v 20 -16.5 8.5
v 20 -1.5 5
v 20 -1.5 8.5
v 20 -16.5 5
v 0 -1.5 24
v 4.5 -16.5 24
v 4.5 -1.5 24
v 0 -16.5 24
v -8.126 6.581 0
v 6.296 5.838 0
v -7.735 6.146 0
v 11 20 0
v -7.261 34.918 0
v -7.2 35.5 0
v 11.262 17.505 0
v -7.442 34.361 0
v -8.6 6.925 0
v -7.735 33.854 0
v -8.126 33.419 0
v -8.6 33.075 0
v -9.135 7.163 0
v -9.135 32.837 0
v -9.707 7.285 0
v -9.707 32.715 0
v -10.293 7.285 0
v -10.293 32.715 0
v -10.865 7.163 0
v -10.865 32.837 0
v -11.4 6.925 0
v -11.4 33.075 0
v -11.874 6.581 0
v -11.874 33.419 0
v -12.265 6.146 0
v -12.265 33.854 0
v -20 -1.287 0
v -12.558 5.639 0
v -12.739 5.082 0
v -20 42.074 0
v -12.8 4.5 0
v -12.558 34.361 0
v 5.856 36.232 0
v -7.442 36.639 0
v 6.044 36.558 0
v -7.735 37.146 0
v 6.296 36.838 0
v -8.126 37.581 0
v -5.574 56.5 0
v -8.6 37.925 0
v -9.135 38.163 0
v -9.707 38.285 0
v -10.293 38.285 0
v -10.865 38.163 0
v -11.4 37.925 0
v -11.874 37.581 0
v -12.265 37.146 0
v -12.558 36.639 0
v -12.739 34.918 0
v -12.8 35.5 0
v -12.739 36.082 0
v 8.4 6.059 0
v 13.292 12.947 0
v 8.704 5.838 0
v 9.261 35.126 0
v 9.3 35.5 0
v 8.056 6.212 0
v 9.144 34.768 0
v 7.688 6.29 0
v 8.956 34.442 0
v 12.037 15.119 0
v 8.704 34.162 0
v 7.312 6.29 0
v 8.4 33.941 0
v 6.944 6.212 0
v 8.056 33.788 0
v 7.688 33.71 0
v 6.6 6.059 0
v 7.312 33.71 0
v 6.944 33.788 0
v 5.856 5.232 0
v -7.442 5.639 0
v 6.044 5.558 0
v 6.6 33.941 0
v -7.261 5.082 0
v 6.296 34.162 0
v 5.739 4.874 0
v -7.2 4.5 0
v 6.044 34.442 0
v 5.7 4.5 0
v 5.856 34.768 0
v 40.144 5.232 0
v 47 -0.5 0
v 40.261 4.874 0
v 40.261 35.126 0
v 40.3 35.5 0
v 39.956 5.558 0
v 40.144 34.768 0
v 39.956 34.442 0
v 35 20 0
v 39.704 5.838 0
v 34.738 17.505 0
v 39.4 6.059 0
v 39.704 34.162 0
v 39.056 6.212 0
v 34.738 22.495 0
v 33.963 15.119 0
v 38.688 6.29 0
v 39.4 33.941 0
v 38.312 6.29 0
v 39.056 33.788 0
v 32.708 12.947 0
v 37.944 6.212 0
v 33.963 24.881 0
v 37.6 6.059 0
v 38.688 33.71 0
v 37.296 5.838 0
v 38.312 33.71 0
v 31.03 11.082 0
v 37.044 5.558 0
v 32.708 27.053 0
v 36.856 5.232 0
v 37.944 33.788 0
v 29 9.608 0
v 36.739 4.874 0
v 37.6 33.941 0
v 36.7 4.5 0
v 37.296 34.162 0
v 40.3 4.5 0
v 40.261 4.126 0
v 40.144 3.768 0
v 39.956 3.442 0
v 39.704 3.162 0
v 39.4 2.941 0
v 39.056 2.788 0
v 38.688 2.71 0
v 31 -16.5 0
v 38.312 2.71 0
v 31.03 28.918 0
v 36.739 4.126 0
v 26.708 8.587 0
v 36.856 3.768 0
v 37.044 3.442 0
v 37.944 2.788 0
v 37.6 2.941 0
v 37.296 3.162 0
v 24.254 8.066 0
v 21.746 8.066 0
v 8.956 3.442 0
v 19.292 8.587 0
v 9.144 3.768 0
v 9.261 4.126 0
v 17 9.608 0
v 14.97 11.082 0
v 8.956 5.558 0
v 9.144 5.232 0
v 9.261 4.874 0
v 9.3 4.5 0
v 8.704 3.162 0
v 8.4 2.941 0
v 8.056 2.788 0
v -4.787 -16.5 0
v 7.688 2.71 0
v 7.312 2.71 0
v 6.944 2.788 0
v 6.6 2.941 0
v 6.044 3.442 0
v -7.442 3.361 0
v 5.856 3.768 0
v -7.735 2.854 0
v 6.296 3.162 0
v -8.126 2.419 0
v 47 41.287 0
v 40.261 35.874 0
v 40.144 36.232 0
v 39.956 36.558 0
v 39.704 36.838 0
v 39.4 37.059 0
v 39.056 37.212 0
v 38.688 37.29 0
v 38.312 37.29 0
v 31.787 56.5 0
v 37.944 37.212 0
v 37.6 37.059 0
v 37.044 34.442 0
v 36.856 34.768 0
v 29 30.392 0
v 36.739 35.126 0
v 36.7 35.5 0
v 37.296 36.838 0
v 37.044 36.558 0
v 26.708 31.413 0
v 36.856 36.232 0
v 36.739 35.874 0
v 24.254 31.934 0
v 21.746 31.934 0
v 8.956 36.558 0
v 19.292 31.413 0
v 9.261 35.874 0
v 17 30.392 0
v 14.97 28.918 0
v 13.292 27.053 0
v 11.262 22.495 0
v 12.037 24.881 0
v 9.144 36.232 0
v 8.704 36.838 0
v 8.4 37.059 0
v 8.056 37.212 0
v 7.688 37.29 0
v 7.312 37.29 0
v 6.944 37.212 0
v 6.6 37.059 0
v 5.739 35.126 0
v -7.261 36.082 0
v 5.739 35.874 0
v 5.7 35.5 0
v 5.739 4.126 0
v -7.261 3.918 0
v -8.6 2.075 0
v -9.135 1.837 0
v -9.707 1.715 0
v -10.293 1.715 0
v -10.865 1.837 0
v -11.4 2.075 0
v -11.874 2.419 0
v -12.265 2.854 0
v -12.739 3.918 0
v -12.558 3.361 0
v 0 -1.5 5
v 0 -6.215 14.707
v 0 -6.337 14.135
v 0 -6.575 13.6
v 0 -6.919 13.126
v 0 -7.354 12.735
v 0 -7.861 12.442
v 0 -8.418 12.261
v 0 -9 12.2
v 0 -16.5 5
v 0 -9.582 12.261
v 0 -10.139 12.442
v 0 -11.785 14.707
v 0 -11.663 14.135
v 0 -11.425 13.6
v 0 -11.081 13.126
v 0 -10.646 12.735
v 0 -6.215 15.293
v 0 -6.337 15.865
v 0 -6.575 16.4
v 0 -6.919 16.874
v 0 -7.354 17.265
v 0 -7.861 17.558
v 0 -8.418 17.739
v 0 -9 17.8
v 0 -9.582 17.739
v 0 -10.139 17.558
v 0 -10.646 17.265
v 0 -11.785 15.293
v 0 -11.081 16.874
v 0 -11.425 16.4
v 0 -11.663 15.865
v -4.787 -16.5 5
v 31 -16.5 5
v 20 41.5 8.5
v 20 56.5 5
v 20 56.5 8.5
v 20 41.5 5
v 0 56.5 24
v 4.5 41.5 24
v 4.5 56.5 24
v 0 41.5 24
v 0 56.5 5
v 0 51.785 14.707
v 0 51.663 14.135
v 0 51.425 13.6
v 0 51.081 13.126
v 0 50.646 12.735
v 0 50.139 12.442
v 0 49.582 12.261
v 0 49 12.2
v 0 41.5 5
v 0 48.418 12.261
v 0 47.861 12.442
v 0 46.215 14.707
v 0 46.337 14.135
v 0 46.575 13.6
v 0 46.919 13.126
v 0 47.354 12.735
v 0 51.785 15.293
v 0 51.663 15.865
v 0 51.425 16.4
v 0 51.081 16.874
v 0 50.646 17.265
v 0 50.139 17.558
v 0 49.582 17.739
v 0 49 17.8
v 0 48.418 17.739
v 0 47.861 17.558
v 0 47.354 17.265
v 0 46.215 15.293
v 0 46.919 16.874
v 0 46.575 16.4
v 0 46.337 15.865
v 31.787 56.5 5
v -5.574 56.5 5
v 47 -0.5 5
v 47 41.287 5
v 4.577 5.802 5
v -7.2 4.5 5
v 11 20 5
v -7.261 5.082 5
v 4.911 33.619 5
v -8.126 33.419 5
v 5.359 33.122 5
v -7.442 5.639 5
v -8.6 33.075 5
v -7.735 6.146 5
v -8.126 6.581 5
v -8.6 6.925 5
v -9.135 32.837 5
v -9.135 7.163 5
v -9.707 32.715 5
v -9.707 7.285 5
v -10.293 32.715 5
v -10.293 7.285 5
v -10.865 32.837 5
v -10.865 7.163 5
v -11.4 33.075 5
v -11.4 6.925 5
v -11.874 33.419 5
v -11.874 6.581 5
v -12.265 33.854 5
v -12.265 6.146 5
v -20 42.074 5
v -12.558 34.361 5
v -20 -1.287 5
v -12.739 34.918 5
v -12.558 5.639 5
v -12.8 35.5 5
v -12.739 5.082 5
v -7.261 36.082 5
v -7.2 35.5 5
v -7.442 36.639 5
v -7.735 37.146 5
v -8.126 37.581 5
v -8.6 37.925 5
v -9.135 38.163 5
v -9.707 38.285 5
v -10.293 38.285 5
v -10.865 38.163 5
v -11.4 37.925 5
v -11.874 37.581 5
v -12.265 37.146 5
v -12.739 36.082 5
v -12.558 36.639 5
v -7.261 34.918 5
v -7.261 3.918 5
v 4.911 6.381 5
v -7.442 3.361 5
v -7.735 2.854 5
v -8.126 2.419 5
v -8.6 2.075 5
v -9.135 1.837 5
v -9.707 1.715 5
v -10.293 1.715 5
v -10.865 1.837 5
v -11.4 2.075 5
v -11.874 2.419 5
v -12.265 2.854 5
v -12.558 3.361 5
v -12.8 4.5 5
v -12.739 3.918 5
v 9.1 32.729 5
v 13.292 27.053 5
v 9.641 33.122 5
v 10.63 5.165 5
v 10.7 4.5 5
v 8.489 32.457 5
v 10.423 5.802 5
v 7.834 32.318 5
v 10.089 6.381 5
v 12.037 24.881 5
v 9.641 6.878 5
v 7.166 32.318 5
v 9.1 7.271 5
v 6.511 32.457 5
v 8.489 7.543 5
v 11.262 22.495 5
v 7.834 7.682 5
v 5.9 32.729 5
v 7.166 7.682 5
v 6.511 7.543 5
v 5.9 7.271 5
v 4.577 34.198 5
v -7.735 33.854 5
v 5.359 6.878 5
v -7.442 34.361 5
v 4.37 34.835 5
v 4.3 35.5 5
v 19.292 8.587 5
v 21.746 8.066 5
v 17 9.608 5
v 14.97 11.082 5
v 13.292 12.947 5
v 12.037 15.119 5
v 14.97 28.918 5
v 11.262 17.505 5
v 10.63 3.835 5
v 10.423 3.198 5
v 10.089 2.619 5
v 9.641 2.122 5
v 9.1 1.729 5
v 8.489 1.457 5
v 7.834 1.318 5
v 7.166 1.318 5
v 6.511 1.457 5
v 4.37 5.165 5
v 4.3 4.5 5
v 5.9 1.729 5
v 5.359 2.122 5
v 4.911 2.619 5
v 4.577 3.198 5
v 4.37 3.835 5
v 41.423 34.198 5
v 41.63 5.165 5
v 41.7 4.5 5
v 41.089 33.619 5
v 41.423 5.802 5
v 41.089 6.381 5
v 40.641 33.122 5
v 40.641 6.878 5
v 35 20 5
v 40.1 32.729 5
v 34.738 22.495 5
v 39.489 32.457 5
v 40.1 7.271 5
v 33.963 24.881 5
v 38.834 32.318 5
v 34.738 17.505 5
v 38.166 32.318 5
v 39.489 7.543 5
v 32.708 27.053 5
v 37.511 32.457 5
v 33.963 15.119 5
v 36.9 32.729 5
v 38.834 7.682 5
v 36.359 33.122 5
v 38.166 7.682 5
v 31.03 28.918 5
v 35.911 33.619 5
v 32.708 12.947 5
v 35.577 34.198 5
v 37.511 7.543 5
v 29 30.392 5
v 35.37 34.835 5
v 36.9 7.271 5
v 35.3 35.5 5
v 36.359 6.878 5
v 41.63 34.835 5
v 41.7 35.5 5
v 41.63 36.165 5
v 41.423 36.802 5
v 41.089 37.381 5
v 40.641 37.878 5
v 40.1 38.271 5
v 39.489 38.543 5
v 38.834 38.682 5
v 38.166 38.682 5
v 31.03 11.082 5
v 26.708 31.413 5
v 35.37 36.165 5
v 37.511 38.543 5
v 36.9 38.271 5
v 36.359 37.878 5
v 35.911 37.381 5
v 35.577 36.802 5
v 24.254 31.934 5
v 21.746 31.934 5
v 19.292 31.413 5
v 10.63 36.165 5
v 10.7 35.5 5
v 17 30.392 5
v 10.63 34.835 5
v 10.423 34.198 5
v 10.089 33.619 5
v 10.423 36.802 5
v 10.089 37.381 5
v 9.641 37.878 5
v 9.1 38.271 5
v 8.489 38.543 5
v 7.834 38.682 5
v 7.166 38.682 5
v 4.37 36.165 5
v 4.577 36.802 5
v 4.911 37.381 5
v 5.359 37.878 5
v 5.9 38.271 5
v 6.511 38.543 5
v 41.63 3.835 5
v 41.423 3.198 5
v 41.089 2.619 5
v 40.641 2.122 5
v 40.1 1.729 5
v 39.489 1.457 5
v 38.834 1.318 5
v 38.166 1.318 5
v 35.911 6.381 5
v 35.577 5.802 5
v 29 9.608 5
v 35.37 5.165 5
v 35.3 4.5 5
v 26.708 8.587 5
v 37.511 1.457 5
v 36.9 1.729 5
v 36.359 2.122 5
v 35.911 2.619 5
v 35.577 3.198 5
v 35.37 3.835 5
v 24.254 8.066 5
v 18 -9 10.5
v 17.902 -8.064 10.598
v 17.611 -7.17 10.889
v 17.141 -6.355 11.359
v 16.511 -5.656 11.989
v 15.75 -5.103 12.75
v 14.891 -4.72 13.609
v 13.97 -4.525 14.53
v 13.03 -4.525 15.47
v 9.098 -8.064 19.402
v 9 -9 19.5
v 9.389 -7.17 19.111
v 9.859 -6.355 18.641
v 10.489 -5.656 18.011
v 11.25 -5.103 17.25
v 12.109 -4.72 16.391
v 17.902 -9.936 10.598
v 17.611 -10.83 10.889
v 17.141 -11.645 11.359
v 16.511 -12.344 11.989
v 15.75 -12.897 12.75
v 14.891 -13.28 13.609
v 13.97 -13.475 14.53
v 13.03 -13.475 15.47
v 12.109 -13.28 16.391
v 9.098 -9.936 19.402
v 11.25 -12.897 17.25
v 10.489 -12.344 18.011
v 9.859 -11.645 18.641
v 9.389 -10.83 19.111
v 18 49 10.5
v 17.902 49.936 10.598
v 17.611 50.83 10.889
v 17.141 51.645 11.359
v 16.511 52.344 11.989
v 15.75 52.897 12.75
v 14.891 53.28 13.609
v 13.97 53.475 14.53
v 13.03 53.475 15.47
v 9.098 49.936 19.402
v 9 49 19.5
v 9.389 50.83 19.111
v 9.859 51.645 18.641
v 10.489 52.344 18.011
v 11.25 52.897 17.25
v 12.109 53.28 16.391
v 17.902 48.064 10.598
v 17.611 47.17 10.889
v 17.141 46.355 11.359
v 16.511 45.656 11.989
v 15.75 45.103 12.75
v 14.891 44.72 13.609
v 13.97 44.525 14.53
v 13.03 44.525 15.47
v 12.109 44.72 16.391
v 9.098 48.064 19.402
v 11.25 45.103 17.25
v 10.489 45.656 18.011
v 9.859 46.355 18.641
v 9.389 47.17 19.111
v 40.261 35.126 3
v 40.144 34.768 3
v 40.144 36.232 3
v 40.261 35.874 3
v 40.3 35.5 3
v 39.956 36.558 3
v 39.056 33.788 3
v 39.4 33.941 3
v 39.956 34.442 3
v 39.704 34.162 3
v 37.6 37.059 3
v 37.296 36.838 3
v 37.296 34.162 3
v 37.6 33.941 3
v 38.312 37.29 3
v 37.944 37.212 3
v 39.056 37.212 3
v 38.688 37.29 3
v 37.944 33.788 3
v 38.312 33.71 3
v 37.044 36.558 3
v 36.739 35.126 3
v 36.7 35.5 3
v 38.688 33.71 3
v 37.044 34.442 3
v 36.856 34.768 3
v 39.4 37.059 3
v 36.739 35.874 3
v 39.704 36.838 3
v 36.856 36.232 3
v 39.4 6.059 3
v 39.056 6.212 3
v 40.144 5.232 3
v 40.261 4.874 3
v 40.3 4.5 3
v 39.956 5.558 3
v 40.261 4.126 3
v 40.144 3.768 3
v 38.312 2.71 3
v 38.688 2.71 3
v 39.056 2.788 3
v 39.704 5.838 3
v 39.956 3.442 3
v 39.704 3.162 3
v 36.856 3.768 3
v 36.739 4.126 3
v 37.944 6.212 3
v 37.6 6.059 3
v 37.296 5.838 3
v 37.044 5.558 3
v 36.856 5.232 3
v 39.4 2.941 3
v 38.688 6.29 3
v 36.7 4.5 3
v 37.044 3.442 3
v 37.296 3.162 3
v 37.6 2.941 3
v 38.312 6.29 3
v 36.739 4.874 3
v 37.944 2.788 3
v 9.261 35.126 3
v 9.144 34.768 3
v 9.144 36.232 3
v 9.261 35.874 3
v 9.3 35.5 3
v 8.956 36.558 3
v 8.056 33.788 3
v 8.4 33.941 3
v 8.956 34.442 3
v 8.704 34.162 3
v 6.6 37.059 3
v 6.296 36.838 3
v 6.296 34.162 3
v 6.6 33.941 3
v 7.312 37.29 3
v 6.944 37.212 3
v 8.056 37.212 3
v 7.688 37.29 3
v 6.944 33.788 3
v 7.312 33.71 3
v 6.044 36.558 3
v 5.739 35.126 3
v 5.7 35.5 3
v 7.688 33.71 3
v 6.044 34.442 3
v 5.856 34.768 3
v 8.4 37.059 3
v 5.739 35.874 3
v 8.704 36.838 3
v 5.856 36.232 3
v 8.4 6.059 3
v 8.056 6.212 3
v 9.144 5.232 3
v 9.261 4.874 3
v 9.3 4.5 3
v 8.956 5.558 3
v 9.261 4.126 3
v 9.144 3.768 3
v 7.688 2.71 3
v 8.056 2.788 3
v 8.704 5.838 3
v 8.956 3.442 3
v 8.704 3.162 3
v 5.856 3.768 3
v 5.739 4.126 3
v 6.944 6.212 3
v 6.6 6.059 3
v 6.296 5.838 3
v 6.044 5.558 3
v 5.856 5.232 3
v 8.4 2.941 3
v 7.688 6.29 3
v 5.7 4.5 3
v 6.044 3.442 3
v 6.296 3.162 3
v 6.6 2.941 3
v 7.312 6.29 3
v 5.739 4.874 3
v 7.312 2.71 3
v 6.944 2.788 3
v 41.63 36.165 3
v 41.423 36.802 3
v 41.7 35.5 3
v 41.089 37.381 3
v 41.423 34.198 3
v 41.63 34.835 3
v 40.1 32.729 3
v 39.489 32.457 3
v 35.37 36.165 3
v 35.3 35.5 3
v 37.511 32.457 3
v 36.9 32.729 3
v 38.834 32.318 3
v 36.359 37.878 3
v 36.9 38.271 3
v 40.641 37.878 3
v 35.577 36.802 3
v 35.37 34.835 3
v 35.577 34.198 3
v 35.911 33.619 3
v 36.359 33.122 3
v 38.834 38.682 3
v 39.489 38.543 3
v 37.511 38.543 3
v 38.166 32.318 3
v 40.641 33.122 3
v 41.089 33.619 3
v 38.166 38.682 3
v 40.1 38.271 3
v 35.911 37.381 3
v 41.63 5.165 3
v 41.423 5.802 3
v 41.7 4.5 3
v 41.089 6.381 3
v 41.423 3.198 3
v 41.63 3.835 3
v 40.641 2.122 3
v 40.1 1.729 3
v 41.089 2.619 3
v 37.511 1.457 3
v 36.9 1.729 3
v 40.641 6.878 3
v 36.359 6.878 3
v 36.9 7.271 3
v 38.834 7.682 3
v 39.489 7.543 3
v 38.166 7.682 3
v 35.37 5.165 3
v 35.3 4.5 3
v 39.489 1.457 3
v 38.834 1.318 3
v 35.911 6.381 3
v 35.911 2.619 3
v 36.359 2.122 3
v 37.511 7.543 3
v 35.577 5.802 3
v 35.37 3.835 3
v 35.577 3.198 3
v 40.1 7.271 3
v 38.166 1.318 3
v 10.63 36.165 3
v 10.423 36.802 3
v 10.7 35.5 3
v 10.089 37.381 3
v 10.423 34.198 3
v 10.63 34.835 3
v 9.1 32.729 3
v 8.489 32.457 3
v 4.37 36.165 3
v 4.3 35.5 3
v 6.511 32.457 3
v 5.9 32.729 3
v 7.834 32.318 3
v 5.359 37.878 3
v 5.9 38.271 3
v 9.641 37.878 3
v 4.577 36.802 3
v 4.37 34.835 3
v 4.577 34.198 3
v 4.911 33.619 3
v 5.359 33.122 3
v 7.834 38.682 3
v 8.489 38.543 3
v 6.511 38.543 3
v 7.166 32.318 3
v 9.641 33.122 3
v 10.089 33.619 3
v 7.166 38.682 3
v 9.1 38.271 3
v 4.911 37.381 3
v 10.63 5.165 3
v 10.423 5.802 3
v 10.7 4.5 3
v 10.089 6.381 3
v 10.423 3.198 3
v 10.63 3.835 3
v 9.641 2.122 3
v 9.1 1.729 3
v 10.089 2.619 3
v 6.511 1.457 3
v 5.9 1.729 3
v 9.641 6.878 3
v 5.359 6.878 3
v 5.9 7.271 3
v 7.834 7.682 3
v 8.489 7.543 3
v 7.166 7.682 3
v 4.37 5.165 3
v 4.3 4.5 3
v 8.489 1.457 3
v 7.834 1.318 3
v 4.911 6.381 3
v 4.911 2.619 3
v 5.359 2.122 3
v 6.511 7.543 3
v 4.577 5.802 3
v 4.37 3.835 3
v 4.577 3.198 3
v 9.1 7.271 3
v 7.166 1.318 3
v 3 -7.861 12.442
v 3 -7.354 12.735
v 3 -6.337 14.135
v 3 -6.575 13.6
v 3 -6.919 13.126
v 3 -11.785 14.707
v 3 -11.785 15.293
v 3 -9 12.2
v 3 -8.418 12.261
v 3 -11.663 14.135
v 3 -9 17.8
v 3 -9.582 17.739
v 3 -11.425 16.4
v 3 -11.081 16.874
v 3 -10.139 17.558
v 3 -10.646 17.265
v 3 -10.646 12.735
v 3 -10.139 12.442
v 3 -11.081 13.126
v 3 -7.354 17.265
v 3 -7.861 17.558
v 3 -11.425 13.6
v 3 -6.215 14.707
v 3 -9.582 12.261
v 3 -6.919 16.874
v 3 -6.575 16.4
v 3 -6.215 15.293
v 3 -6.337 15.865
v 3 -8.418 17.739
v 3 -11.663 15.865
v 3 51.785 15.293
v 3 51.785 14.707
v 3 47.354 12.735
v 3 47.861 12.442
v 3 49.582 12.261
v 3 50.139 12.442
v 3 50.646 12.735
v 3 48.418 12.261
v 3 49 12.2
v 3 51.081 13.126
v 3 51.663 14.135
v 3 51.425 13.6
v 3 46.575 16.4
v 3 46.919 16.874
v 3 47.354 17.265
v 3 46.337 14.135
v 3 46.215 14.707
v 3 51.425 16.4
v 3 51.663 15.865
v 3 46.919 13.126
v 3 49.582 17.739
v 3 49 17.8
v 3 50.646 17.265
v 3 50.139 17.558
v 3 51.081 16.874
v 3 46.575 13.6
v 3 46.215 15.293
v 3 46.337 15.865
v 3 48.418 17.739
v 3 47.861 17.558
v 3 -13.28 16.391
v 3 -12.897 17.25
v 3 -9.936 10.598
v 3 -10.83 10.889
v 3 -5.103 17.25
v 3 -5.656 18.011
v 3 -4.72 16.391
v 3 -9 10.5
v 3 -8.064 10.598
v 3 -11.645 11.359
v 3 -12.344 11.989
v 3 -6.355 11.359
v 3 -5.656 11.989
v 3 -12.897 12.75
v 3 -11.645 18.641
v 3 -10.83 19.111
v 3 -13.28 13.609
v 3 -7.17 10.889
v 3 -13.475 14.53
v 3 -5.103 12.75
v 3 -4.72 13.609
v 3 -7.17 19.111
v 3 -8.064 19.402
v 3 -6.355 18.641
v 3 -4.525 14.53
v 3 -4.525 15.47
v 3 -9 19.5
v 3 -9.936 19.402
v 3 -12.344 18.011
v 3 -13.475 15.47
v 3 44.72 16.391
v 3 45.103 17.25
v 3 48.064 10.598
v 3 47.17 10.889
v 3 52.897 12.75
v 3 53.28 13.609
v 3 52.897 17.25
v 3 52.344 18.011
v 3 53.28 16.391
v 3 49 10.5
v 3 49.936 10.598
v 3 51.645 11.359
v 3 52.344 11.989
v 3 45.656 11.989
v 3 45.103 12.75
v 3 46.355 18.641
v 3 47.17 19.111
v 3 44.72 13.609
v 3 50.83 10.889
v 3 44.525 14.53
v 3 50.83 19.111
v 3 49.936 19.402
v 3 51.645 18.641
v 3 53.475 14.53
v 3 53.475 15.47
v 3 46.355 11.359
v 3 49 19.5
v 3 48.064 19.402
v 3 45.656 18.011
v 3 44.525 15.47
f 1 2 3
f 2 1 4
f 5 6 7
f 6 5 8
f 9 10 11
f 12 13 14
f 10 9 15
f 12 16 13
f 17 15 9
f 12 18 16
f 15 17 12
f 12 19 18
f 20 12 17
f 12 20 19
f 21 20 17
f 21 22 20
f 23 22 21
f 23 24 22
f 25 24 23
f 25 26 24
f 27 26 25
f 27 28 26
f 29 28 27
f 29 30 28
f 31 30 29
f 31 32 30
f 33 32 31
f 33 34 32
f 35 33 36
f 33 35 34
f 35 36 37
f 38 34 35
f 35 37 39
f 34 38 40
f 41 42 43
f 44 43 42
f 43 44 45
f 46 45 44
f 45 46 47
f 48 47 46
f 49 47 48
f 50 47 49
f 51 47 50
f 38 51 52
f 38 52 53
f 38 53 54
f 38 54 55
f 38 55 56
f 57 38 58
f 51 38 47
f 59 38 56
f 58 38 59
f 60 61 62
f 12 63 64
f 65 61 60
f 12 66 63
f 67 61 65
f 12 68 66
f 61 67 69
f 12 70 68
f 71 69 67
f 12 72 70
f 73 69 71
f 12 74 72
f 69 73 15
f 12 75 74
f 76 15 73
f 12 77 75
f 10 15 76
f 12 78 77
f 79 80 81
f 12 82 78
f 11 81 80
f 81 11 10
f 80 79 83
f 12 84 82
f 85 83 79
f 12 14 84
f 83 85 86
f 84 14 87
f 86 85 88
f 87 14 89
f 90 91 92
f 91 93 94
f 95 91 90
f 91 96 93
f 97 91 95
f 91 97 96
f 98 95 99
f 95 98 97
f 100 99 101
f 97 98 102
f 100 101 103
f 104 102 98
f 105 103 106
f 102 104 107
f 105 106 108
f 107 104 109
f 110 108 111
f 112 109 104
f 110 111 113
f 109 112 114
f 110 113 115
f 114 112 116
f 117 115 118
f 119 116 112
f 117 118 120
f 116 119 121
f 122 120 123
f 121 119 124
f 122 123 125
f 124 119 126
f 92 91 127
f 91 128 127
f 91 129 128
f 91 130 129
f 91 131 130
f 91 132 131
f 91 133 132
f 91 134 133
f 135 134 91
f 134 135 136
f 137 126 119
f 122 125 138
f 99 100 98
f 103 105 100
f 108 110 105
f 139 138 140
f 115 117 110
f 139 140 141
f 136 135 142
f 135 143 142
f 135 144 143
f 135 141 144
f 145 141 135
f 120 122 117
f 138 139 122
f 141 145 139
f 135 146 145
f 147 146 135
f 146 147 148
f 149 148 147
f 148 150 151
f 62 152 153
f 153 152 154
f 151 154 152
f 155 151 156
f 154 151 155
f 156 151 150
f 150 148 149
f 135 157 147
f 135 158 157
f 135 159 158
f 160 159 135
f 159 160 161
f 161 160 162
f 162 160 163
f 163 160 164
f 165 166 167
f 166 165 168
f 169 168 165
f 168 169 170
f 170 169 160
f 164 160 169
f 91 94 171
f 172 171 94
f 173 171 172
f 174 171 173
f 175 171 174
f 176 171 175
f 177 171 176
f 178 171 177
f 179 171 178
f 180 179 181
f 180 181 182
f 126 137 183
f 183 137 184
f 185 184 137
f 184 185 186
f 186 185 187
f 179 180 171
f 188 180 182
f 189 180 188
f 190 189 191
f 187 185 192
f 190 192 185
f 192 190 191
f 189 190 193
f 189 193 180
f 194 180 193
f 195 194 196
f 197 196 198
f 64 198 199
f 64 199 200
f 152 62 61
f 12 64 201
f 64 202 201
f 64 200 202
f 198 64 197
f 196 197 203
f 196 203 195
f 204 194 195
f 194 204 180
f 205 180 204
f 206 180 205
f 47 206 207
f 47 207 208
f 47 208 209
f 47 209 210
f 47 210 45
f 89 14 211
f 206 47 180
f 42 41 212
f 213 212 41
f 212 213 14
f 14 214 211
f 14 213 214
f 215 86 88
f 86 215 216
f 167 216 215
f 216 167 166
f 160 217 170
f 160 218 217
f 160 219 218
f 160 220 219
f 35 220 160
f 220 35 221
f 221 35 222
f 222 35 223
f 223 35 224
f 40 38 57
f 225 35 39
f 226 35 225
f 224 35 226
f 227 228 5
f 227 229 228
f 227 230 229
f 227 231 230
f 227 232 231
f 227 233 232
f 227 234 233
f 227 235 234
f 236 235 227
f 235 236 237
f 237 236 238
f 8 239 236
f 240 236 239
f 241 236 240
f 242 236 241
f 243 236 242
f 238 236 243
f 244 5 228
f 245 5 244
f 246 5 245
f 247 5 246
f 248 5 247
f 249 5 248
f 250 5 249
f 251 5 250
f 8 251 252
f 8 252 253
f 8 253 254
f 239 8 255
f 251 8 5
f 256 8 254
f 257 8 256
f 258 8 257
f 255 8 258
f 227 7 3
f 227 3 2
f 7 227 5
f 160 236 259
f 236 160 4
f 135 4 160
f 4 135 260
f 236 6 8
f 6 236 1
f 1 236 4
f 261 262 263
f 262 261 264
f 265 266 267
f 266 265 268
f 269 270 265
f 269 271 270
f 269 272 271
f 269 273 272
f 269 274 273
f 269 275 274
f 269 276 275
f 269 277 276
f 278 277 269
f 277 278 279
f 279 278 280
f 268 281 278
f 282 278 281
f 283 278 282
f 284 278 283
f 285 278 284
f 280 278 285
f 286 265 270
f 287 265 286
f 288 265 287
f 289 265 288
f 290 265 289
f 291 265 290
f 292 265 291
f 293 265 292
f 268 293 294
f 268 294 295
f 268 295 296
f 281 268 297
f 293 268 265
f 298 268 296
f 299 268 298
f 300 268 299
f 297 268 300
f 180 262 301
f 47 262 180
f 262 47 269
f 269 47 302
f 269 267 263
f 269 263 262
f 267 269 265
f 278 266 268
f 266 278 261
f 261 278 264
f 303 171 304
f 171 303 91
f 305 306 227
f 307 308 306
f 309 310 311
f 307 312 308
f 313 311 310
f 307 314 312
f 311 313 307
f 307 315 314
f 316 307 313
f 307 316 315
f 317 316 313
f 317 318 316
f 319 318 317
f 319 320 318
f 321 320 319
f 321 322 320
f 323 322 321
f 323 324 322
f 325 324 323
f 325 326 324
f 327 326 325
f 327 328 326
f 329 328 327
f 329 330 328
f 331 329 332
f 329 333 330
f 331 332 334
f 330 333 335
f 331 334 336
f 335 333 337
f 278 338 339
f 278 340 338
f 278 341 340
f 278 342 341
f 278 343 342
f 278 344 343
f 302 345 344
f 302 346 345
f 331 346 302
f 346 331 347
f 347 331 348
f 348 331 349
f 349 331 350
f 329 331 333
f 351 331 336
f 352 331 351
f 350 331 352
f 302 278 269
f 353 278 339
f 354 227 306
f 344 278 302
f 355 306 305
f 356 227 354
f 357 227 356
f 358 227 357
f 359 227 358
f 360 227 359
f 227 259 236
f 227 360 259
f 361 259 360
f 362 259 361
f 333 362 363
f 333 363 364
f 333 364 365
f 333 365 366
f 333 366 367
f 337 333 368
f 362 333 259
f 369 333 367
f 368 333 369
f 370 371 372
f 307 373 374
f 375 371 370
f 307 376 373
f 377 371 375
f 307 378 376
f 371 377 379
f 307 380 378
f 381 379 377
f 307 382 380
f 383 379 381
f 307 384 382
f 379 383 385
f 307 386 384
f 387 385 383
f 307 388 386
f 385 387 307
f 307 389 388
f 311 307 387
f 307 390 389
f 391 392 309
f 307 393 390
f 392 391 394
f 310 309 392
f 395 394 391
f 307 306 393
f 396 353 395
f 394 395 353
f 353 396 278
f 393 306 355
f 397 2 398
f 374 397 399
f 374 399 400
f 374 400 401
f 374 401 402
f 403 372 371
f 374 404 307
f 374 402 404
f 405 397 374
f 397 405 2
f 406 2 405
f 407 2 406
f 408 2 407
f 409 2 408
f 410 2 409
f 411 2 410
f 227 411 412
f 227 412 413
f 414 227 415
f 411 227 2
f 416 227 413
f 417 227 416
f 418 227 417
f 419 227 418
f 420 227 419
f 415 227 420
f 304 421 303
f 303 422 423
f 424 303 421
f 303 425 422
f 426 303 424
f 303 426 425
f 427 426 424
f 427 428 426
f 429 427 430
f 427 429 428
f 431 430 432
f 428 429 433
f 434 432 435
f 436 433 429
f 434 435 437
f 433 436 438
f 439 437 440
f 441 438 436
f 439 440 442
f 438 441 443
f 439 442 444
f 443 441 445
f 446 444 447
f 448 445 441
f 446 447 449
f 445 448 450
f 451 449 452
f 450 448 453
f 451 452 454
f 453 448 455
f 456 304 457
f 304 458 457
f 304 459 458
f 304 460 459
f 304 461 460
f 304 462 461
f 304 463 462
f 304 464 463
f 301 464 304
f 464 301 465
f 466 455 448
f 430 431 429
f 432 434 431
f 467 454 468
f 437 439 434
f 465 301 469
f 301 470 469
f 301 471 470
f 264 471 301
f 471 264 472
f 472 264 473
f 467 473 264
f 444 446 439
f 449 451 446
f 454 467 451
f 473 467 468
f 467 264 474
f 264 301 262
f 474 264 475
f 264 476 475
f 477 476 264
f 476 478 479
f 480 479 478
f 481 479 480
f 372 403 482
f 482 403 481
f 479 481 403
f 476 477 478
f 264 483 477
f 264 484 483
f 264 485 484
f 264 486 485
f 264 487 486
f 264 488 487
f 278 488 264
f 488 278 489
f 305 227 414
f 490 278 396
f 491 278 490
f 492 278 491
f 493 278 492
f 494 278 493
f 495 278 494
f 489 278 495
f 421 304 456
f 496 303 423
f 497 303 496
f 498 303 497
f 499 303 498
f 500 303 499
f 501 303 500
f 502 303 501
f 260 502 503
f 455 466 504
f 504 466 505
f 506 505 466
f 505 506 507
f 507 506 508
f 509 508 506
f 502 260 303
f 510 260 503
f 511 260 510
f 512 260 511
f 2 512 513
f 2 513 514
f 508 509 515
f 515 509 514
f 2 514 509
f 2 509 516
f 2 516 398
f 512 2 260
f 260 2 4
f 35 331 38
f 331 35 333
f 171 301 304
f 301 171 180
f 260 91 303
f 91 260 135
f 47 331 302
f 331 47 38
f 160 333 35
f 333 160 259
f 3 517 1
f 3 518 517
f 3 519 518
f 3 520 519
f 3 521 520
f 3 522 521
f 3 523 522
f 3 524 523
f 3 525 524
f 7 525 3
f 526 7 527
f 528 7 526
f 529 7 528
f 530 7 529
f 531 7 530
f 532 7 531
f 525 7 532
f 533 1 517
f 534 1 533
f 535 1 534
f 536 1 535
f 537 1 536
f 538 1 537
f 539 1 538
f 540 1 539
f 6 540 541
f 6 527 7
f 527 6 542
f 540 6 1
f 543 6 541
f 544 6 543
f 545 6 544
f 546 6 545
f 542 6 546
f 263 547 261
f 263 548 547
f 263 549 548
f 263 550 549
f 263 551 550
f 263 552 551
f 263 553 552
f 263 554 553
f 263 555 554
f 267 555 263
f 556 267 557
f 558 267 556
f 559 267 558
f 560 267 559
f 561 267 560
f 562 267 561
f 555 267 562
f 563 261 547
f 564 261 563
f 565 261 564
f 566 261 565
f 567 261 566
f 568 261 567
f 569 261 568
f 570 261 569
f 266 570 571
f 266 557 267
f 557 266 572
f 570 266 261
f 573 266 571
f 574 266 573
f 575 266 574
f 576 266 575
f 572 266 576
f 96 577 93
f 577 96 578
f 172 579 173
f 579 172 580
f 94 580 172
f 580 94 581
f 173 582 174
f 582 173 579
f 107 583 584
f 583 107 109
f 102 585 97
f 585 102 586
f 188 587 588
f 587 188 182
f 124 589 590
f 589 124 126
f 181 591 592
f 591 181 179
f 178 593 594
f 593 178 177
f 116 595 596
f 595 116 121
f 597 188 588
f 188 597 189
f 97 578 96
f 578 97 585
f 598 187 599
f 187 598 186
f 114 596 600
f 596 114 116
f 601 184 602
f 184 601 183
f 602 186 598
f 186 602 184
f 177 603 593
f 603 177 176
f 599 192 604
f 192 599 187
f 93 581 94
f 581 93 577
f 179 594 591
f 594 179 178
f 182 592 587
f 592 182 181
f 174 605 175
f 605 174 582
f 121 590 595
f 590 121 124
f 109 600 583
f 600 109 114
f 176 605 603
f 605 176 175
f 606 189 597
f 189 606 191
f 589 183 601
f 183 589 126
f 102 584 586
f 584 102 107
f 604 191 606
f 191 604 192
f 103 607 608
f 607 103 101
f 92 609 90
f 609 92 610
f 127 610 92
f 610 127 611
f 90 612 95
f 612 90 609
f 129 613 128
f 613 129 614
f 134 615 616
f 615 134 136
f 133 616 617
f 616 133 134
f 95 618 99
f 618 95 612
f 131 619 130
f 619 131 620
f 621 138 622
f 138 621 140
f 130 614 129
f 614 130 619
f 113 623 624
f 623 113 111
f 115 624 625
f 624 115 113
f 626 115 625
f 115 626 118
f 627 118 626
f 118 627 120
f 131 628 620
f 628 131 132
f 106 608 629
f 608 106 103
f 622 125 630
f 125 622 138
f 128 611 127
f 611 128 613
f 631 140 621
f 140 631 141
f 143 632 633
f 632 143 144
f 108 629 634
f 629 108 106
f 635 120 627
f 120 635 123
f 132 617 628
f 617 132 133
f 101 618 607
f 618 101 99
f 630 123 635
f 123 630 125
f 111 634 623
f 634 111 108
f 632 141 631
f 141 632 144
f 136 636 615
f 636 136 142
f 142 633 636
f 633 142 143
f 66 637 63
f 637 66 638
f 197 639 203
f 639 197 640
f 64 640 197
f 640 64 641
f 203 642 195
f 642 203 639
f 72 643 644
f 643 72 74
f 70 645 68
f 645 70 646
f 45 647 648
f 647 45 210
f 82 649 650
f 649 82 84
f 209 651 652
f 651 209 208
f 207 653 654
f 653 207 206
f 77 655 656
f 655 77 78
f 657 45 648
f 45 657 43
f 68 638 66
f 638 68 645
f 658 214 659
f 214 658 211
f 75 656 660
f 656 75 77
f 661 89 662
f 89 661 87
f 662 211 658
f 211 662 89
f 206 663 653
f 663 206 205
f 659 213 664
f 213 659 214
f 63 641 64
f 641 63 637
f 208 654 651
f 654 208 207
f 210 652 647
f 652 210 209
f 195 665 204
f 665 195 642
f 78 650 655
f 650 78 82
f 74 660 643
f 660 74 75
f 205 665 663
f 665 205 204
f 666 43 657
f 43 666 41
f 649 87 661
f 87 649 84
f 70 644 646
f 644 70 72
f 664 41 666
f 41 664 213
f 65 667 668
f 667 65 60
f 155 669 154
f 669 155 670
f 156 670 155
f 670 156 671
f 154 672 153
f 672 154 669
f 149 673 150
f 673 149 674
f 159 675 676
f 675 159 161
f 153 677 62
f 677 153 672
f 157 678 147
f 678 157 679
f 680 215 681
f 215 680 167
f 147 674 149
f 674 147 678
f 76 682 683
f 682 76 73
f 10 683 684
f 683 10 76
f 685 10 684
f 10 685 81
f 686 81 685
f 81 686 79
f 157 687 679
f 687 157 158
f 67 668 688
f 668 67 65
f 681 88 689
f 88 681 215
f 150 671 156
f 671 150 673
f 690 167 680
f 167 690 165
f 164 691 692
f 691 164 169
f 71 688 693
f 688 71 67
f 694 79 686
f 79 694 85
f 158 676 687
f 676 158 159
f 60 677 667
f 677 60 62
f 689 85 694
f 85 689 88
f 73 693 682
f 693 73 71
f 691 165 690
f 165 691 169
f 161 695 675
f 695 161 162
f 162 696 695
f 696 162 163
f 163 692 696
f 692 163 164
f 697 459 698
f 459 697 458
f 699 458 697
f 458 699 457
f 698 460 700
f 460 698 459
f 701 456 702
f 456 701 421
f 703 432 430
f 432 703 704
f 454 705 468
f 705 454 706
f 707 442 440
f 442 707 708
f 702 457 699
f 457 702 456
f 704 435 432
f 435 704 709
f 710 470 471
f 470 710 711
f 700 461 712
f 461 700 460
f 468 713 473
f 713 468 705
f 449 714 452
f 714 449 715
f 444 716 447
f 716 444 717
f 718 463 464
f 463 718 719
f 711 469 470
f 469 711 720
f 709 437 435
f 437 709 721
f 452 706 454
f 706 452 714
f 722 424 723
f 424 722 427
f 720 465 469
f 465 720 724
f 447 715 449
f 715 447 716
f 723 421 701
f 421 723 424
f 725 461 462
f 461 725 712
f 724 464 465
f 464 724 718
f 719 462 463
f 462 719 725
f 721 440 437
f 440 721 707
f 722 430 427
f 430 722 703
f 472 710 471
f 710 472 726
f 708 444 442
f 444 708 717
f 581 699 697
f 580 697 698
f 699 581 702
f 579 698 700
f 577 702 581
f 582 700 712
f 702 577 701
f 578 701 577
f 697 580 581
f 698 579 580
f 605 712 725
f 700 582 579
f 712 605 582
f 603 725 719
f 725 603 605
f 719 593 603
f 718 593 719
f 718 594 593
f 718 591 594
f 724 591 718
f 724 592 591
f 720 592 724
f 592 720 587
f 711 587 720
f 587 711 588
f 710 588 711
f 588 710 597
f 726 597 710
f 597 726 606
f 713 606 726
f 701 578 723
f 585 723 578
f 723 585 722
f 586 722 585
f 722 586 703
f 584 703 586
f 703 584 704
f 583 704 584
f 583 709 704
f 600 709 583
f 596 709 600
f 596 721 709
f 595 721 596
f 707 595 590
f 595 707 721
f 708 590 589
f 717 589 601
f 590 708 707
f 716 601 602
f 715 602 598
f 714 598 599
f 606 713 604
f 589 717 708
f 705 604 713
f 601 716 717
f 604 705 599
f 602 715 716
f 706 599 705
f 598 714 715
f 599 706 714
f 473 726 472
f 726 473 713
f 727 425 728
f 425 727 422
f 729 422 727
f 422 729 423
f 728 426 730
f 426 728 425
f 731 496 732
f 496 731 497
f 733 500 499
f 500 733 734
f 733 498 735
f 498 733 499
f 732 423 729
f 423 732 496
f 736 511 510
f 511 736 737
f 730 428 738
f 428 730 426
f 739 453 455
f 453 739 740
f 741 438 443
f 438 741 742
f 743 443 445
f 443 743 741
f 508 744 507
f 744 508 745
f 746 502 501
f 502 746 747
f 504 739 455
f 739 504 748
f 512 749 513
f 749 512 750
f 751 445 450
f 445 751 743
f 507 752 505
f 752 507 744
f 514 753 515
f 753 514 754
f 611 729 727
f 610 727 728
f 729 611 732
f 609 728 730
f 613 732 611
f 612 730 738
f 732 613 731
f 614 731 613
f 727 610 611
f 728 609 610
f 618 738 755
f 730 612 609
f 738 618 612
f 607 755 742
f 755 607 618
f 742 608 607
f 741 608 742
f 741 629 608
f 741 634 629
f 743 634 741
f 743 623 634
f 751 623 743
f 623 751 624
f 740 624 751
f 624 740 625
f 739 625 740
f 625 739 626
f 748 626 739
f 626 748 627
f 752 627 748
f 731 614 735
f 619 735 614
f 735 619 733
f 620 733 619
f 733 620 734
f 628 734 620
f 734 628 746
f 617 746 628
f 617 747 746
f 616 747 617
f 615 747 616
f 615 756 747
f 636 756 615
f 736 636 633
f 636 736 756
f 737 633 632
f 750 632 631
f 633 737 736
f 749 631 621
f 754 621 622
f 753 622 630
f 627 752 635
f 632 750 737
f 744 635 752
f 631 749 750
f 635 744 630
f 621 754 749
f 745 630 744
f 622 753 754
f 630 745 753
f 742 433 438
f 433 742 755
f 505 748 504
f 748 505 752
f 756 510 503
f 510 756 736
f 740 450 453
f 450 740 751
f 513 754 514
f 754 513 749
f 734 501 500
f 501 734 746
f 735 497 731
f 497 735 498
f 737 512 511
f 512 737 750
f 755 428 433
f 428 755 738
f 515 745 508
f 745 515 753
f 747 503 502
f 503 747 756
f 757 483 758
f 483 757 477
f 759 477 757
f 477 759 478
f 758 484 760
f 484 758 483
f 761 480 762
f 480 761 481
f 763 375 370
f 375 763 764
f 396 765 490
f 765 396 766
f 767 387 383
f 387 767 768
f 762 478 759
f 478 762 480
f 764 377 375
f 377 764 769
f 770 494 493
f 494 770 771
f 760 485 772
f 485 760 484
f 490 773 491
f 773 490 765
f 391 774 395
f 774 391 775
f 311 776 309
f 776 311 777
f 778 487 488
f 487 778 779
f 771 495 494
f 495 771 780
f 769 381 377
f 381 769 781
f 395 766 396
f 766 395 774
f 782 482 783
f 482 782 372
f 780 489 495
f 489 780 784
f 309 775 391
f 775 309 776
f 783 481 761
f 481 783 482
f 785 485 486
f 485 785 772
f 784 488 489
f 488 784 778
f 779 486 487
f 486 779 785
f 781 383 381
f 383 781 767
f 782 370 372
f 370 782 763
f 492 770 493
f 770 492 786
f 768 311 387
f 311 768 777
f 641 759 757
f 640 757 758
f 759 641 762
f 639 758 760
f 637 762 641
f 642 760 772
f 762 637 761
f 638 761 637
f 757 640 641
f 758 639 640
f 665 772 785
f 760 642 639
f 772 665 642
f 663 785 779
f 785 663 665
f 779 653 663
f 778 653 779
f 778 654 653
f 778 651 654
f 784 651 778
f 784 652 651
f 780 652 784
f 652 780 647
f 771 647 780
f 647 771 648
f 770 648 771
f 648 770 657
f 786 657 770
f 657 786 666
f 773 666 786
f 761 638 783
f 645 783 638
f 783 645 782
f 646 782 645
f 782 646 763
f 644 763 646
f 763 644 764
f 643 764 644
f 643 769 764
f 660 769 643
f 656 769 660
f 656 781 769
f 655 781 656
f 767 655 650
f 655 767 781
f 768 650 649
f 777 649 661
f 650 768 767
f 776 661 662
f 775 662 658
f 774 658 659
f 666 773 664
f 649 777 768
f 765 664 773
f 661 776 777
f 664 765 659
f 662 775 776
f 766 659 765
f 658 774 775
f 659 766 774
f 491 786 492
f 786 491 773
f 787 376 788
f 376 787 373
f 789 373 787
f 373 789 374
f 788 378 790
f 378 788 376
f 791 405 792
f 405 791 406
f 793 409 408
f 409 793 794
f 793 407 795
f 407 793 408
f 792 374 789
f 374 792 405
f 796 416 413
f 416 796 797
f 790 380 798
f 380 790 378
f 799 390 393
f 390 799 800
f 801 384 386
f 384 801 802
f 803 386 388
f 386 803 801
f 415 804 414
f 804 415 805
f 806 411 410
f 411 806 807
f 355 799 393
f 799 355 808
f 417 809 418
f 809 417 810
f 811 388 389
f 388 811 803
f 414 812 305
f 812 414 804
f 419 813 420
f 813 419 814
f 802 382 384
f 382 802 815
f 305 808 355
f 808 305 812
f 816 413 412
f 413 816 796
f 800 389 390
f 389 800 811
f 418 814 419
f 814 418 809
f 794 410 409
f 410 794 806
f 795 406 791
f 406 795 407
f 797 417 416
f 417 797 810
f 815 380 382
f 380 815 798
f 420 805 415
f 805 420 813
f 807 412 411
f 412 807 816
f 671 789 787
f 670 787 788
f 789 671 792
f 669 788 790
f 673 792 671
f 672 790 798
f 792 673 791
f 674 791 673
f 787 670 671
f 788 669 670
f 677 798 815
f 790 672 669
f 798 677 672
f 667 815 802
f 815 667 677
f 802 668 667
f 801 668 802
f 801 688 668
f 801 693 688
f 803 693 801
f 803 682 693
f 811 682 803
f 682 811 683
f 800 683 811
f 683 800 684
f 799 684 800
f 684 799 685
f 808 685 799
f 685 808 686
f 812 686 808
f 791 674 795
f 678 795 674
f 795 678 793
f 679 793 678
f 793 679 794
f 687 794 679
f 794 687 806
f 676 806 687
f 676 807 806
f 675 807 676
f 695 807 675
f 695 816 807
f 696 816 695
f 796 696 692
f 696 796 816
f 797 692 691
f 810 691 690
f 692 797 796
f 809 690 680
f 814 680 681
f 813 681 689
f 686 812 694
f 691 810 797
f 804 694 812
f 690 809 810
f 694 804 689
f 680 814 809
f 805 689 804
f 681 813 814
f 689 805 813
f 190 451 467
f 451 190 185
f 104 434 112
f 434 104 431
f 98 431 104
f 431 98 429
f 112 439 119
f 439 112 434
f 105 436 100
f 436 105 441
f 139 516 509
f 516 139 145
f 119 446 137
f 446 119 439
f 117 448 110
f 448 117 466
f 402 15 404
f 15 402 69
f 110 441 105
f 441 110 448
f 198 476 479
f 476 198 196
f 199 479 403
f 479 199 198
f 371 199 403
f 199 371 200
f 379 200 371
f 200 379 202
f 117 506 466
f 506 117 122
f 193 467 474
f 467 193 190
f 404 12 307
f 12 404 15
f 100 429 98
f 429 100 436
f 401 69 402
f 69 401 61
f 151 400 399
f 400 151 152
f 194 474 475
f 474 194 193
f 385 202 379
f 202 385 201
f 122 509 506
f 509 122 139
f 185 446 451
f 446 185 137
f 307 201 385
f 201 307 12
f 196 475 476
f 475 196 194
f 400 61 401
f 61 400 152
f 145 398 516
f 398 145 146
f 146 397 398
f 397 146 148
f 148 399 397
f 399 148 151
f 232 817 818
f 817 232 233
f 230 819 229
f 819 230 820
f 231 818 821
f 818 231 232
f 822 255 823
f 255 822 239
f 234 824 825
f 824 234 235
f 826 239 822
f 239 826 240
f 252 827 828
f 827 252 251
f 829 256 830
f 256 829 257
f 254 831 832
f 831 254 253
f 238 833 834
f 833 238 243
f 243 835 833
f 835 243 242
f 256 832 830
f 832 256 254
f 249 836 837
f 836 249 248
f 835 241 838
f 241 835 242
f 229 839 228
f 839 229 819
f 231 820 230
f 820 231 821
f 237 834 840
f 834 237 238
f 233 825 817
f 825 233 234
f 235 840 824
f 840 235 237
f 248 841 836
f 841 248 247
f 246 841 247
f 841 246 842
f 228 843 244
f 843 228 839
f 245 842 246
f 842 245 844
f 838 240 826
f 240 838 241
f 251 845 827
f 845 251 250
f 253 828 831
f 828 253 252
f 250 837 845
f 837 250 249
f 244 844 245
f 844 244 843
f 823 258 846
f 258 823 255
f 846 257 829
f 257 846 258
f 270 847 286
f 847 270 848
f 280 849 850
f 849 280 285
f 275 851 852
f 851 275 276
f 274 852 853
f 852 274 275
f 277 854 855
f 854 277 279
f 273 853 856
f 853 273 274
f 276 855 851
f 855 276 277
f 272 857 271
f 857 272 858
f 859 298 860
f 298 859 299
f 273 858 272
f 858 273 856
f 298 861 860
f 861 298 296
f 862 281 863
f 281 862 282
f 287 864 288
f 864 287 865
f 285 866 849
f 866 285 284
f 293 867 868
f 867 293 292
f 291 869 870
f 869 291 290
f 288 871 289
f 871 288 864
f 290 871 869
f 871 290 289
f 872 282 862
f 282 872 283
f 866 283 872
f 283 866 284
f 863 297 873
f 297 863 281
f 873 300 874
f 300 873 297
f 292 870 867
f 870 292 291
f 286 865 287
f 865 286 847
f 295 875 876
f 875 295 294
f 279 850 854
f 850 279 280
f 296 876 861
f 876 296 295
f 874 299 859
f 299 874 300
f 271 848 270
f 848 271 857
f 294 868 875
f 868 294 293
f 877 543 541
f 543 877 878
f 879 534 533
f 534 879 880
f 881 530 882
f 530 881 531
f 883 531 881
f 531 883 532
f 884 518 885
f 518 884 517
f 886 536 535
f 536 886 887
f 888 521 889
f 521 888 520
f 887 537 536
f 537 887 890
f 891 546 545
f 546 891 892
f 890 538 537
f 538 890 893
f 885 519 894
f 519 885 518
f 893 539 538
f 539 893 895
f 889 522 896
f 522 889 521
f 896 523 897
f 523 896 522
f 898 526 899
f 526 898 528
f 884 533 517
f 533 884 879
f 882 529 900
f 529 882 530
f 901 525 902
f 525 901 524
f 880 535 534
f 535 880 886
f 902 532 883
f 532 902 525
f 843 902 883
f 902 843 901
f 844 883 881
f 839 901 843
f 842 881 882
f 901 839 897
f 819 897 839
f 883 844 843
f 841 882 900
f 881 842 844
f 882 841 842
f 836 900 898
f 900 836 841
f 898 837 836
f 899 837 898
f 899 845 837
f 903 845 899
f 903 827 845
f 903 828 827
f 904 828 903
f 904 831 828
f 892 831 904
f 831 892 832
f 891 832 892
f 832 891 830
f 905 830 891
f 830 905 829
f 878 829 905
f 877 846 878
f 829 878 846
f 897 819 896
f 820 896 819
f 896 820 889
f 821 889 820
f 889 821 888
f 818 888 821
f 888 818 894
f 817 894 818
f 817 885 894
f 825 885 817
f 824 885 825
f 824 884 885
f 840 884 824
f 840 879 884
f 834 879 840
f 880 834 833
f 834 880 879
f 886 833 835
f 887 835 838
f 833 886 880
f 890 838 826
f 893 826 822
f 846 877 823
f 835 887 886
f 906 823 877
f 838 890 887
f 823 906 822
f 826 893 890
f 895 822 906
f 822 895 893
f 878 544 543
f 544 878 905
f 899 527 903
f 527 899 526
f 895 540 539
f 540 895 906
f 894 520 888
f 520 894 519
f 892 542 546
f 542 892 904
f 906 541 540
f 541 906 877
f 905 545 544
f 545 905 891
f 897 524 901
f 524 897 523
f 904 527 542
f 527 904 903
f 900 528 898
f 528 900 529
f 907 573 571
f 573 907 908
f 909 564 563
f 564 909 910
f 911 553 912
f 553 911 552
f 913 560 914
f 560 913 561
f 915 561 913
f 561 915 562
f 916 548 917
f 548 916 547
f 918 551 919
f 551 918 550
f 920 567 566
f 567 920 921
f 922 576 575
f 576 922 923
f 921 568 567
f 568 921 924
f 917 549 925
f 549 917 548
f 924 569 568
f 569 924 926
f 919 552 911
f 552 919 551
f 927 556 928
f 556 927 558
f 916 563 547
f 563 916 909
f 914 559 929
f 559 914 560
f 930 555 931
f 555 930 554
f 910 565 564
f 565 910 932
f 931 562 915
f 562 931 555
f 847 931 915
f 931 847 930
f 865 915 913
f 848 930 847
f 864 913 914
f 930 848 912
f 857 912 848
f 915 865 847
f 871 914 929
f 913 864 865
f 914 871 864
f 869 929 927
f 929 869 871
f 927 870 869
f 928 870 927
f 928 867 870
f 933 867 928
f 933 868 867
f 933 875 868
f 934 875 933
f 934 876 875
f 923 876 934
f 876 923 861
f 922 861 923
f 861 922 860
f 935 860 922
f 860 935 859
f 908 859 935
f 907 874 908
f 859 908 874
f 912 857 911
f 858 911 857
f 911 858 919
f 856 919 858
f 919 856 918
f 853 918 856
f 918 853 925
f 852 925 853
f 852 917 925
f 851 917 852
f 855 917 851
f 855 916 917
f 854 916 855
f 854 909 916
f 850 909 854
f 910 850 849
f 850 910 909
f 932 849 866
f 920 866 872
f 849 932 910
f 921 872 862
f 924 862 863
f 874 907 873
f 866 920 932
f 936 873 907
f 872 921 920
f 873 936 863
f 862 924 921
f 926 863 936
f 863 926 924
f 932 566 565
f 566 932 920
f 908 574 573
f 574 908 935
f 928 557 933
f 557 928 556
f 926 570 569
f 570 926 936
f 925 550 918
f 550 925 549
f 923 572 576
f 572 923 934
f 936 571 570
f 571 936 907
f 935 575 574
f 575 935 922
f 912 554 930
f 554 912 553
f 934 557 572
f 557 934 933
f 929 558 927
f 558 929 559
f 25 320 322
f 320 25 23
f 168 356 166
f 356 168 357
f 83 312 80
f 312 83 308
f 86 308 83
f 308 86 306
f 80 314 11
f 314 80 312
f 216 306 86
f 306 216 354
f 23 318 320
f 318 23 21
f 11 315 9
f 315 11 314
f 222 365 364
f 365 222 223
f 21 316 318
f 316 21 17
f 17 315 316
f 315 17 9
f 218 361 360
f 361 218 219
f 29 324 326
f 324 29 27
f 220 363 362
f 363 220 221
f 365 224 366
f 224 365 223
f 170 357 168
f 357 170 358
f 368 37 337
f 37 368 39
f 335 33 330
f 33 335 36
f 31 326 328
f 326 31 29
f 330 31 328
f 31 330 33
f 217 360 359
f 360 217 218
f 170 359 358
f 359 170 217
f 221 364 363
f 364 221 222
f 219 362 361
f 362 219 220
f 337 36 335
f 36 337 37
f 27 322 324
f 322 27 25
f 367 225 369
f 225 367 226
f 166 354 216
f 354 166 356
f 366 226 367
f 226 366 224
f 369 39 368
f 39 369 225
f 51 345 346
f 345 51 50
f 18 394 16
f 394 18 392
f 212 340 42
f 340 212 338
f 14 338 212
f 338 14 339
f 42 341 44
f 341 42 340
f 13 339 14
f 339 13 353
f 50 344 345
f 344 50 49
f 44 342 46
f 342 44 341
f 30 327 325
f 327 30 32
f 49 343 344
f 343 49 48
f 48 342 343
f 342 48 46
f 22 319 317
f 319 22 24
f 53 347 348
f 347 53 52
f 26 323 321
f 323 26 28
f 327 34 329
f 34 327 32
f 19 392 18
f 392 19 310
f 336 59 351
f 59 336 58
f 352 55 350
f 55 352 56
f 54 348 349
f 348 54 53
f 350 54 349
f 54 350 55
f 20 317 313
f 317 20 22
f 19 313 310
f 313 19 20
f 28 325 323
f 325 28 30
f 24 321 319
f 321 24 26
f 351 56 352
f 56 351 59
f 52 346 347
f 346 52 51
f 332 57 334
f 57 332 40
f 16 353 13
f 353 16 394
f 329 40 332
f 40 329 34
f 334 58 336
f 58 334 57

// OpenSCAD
// PRUSA iteration3
// Z axis bottom holder
// GNU GPL v3
// Josef Průša <iam@josefprusa.cz> and contributors
// http://www.reprap.org/wiki/Prusa_Mendel
// http://prusamendel.org

module z_bottom_base(){
 translate([0,-16.5,0]) cube([20,15,24]); // plate touching the base
 translate([0,41.5,0]) cube([20,15,24]); // plate touching the base
 translate([-20,-16.5,0]) cube([67,73,5]); // plate touching the base
}

module z_bottom_fancy(){
    translate([47-6,-1+2.5+67,0]) rotate([0,0,-45-90]) translate([-15,0,-1]) cube([30,30,51]);
    translate([47-6,-9+2.5,0]) rotate([0,0,-45-90]) translate([-15,0,-1]) cube([30,30,51]);
 
    translate([-36,-1+2.5+67,0]) rotate([0,0,-45-90]) translate([-15,0,-1]) cube([30,30,51]);
    translate([-36,-9+2.5,0]) rotate([0,0,-45-90]) translate([-15,0,-1]) cube([30,30,51]);
 
    // Stiffner cut out
    translate([23,0,5.5]) rotate([0,-45,0]) translate([0,-17.1,0]) cube([30,80,30]);
}

module z_bottom_holes(){
    // Frame mounting screw holes
    translate([-1,-9,15]) rotate([0,90,0]) cylinder(h = 50, r=2.8, $fn=30);
    translate([-1,49,15]) rotate([0,90,0]) cylinder(h = 50, r=2.8, $fn=30);

    // Frame mounting screw head holes
    translate([3,-9,15]) rotate([0,90,0]) cylinder(h = 20, r=4.5, $fn=30);
    translate([3,49,15]) rotate([0,90,0]) cylinder(h = 20, r=4.5, $fn=30);

    // Frame mounting screw holes
    translate([-10,4.5,-1]) cylinder(h = 50, r=2.8, $fn=30);
    translate([-10,35.5,-1]) cylinder(h = 50, r=2.8, $fn=30);

    // motor mounting
    translate([23,20,-1]){

    translate([15.5,15.5,-1]) cylinder(h = 30, r=1.8, $fn=30);
    translate([15.5,-15.5,-1]) cylinder(h = 30, r=1.8, $fn=30);
    translate([-15.5,15.5,-1]) cylinder(h = 30, r=1.8, $fn=30);
    translate([-15.5,-15.5,-1]) cylinder(h = 30, r=1.8, $fn=30);

    translate([15.5,15.5,4]) cylinder(h = 30, r=3.2, $fn=30);
    translate([15.5,-15.5,4]) cylinder(h = 30, r=3.2, $fn=30);
    translate([-15.5,15.5,4]) cylinder(h = 30, r=3.2, $fn=30);
    translate([-15.5,-15.5,4]) cylinder(h = 30, r=3.2, $fn=30);

    translate([0,0,-1]) cylinder(h = 20, r=12, $fn=30);
 }

}

difference(){
    z_bottom_base();
    z_bottom_fancy();
    z_bottom_holes();
}
